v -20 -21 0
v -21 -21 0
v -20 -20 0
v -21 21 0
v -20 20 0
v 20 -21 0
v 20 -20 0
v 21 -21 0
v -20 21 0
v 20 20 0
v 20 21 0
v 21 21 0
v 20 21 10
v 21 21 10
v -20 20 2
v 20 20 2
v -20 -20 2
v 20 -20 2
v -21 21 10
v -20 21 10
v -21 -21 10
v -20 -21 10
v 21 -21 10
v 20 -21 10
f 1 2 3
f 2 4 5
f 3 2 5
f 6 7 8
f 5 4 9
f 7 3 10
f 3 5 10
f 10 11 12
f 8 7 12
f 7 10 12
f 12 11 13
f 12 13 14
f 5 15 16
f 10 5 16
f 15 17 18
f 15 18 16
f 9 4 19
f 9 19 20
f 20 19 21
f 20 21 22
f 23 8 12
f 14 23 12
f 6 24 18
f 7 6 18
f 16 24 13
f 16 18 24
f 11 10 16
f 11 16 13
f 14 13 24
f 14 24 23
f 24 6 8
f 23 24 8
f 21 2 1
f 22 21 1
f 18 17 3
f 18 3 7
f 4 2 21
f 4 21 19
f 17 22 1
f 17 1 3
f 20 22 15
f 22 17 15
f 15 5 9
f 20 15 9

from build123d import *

# Parameters (mm, degrees)
SKETCH1_W           = 42
SKETCH1_H           = 42
SKETCH1_W_2         = 40
SKETCH1_H_2         = 40
BOSS_EXTRUDE1_DEPTH = 10
SKETCH3_W           = 2
SKETCH3_H           = 40
BOSS_EXTRUDE2_DEPTH = 40
SKETCH5_W           = 40
SKETCH5_H           = 1
CUT_EXTRUDE1_DEPTH  = 10
SKETCH6_W           = 40
SKETCH6_H           = 1
CUT_EXTRUDE2_DEPTH  = 10


with BuildPart() as part:
    # Sketch1 → Boss-Extrude1 (new body)
    with BuildSketch(Plane.XY):
        Rectangle(SKETCH1_W, SKETCH1_H)
        Rectangle(SKETCH1_W_2, SKETCH1_H_2, mode=Mode.SUBTRACT)
    extrude(amount=BOSS_EXTRUDE1_DEPTH)

    # Sketch3 → Boss-Extrude2 (add)
    with BuildSketch(Plane(origin=(-20, 0, 0), x_dir=(0, 0, -1), z_dir=(1, 0, 0))):
        with Locations((-1, 0)):
            Rectangle(SKETCH3_W, SKETCH3_H)
    extrude(amount=BOSS_EXTRUDE2_DEPTH)

    # Sketch5 → Cut-Extrude1 (cut)
    with BuildSketch(Plane.XY.offset(10)):
        with Locations((0, 20.5)):
            Rectangle(SKETCH5_W, SKETCH5_H)
    extrude(amount=-CUT_EXTRUDE1_DEPTH, mode=Mode.SUBTRACT)

    # Sketch6 → Cut-Extrude2 (cut)
    with BuildSketch(Plane.XY.offset(10)):
        with Locations((0, -20.5)):
            Rectangle(SKETCH6_W, SKETCH6_H)
    extrude(amount=-CUT_EXTRUDE2_DEPTH, mode=Mode.SUBTRACT)


solid = part.part
